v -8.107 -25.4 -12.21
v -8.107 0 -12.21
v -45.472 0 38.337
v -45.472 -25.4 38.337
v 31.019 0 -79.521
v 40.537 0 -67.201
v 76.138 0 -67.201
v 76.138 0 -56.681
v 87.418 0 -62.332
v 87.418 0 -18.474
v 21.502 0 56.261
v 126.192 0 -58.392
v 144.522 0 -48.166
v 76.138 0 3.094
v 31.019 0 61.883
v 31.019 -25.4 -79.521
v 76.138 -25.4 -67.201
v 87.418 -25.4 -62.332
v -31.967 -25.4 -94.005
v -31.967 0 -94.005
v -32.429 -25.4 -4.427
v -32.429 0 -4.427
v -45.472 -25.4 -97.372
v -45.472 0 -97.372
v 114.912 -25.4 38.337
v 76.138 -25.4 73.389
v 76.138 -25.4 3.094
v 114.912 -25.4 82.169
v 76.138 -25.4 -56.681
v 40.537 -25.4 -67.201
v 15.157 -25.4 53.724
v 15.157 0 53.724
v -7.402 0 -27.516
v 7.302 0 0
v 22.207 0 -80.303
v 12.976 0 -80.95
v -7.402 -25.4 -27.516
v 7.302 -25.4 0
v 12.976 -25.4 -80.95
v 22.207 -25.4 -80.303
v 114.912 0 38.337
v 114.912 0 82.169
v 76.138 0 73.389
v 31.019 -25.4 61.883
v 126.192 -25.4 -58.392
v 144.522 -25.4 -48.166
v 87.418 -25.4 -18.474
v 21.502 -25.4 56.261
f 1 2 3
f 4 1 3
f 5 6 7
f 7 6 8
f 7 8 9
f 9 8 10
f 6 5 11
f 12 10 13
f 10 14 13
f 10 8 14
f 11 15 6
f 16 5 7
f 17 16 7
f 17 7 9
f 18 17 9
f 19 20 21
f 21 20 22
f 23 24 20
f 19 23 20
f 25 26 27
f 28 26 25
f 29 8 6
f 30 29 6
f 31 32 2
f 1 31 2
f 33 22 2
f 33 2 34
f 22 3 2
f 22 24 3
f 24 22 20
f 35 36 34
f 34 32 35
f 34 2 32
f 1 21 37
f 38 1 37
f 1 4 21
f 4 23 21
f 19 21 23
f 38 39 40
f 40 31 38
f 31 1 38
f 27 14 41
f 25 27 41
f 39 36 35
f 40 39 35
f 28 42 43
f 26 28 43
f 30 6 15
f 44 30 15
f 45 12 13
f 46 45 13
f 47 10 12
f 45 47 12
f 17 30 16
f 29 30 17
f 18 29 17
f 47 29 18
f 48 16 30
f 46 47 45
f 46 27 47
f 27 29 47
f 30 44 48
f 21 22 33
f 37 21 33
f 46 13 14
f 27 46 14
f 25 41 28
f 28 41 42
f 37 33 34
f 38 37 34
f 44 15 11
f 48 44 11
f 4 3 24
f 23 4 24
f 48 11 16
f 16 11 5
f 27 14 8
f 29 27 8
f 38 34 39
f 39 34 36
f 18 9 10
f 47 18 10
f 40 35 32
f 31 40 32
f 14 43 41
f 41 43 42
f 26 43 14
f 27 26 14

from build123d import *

# Parameters (mm, degrees)
F1_DEPTH = 25.4


with BuildPart() as f1:
    # F0 (on Front) → F1 (new body)
    with BuildSketch(Plane.XZ):
        Polygon((-8.107326, -12.210169), (-45.471512, 38.337391), (-45.471512, -97.372167), (-31.966874, -94.004562), (-32.4293, -4.426641), (-7.402337, -27.51632), (7.302303, 0), (12.976245, -80.949513), (22.207018, -80.302507), (15.157172, 53.724427), align=None)
        Polygon((76.138355, 73.388599), (76.138355, 3.093638), (114.912495, 38.337391), (114.912495, 82.168818), align=None)
        Polygon((31.019324, 61.882891), (21.502038, 56.261014), (31.019324, -79.521067), (76.138355, -67.201324), (76.138355, -56.681074), (40.536627, -67.201324), align=None)
        Polygon((76.138355, -56.681074), (76.138355, -67.201324), (87.418109, -62.33165), (87.418109, -18.47362), (126.192272, -58.391877), (144.521877, -48.165679), (76.138355, 3.093638), align=None)
    extrude(amount=F1_DEPTH)


solid = f1.part
